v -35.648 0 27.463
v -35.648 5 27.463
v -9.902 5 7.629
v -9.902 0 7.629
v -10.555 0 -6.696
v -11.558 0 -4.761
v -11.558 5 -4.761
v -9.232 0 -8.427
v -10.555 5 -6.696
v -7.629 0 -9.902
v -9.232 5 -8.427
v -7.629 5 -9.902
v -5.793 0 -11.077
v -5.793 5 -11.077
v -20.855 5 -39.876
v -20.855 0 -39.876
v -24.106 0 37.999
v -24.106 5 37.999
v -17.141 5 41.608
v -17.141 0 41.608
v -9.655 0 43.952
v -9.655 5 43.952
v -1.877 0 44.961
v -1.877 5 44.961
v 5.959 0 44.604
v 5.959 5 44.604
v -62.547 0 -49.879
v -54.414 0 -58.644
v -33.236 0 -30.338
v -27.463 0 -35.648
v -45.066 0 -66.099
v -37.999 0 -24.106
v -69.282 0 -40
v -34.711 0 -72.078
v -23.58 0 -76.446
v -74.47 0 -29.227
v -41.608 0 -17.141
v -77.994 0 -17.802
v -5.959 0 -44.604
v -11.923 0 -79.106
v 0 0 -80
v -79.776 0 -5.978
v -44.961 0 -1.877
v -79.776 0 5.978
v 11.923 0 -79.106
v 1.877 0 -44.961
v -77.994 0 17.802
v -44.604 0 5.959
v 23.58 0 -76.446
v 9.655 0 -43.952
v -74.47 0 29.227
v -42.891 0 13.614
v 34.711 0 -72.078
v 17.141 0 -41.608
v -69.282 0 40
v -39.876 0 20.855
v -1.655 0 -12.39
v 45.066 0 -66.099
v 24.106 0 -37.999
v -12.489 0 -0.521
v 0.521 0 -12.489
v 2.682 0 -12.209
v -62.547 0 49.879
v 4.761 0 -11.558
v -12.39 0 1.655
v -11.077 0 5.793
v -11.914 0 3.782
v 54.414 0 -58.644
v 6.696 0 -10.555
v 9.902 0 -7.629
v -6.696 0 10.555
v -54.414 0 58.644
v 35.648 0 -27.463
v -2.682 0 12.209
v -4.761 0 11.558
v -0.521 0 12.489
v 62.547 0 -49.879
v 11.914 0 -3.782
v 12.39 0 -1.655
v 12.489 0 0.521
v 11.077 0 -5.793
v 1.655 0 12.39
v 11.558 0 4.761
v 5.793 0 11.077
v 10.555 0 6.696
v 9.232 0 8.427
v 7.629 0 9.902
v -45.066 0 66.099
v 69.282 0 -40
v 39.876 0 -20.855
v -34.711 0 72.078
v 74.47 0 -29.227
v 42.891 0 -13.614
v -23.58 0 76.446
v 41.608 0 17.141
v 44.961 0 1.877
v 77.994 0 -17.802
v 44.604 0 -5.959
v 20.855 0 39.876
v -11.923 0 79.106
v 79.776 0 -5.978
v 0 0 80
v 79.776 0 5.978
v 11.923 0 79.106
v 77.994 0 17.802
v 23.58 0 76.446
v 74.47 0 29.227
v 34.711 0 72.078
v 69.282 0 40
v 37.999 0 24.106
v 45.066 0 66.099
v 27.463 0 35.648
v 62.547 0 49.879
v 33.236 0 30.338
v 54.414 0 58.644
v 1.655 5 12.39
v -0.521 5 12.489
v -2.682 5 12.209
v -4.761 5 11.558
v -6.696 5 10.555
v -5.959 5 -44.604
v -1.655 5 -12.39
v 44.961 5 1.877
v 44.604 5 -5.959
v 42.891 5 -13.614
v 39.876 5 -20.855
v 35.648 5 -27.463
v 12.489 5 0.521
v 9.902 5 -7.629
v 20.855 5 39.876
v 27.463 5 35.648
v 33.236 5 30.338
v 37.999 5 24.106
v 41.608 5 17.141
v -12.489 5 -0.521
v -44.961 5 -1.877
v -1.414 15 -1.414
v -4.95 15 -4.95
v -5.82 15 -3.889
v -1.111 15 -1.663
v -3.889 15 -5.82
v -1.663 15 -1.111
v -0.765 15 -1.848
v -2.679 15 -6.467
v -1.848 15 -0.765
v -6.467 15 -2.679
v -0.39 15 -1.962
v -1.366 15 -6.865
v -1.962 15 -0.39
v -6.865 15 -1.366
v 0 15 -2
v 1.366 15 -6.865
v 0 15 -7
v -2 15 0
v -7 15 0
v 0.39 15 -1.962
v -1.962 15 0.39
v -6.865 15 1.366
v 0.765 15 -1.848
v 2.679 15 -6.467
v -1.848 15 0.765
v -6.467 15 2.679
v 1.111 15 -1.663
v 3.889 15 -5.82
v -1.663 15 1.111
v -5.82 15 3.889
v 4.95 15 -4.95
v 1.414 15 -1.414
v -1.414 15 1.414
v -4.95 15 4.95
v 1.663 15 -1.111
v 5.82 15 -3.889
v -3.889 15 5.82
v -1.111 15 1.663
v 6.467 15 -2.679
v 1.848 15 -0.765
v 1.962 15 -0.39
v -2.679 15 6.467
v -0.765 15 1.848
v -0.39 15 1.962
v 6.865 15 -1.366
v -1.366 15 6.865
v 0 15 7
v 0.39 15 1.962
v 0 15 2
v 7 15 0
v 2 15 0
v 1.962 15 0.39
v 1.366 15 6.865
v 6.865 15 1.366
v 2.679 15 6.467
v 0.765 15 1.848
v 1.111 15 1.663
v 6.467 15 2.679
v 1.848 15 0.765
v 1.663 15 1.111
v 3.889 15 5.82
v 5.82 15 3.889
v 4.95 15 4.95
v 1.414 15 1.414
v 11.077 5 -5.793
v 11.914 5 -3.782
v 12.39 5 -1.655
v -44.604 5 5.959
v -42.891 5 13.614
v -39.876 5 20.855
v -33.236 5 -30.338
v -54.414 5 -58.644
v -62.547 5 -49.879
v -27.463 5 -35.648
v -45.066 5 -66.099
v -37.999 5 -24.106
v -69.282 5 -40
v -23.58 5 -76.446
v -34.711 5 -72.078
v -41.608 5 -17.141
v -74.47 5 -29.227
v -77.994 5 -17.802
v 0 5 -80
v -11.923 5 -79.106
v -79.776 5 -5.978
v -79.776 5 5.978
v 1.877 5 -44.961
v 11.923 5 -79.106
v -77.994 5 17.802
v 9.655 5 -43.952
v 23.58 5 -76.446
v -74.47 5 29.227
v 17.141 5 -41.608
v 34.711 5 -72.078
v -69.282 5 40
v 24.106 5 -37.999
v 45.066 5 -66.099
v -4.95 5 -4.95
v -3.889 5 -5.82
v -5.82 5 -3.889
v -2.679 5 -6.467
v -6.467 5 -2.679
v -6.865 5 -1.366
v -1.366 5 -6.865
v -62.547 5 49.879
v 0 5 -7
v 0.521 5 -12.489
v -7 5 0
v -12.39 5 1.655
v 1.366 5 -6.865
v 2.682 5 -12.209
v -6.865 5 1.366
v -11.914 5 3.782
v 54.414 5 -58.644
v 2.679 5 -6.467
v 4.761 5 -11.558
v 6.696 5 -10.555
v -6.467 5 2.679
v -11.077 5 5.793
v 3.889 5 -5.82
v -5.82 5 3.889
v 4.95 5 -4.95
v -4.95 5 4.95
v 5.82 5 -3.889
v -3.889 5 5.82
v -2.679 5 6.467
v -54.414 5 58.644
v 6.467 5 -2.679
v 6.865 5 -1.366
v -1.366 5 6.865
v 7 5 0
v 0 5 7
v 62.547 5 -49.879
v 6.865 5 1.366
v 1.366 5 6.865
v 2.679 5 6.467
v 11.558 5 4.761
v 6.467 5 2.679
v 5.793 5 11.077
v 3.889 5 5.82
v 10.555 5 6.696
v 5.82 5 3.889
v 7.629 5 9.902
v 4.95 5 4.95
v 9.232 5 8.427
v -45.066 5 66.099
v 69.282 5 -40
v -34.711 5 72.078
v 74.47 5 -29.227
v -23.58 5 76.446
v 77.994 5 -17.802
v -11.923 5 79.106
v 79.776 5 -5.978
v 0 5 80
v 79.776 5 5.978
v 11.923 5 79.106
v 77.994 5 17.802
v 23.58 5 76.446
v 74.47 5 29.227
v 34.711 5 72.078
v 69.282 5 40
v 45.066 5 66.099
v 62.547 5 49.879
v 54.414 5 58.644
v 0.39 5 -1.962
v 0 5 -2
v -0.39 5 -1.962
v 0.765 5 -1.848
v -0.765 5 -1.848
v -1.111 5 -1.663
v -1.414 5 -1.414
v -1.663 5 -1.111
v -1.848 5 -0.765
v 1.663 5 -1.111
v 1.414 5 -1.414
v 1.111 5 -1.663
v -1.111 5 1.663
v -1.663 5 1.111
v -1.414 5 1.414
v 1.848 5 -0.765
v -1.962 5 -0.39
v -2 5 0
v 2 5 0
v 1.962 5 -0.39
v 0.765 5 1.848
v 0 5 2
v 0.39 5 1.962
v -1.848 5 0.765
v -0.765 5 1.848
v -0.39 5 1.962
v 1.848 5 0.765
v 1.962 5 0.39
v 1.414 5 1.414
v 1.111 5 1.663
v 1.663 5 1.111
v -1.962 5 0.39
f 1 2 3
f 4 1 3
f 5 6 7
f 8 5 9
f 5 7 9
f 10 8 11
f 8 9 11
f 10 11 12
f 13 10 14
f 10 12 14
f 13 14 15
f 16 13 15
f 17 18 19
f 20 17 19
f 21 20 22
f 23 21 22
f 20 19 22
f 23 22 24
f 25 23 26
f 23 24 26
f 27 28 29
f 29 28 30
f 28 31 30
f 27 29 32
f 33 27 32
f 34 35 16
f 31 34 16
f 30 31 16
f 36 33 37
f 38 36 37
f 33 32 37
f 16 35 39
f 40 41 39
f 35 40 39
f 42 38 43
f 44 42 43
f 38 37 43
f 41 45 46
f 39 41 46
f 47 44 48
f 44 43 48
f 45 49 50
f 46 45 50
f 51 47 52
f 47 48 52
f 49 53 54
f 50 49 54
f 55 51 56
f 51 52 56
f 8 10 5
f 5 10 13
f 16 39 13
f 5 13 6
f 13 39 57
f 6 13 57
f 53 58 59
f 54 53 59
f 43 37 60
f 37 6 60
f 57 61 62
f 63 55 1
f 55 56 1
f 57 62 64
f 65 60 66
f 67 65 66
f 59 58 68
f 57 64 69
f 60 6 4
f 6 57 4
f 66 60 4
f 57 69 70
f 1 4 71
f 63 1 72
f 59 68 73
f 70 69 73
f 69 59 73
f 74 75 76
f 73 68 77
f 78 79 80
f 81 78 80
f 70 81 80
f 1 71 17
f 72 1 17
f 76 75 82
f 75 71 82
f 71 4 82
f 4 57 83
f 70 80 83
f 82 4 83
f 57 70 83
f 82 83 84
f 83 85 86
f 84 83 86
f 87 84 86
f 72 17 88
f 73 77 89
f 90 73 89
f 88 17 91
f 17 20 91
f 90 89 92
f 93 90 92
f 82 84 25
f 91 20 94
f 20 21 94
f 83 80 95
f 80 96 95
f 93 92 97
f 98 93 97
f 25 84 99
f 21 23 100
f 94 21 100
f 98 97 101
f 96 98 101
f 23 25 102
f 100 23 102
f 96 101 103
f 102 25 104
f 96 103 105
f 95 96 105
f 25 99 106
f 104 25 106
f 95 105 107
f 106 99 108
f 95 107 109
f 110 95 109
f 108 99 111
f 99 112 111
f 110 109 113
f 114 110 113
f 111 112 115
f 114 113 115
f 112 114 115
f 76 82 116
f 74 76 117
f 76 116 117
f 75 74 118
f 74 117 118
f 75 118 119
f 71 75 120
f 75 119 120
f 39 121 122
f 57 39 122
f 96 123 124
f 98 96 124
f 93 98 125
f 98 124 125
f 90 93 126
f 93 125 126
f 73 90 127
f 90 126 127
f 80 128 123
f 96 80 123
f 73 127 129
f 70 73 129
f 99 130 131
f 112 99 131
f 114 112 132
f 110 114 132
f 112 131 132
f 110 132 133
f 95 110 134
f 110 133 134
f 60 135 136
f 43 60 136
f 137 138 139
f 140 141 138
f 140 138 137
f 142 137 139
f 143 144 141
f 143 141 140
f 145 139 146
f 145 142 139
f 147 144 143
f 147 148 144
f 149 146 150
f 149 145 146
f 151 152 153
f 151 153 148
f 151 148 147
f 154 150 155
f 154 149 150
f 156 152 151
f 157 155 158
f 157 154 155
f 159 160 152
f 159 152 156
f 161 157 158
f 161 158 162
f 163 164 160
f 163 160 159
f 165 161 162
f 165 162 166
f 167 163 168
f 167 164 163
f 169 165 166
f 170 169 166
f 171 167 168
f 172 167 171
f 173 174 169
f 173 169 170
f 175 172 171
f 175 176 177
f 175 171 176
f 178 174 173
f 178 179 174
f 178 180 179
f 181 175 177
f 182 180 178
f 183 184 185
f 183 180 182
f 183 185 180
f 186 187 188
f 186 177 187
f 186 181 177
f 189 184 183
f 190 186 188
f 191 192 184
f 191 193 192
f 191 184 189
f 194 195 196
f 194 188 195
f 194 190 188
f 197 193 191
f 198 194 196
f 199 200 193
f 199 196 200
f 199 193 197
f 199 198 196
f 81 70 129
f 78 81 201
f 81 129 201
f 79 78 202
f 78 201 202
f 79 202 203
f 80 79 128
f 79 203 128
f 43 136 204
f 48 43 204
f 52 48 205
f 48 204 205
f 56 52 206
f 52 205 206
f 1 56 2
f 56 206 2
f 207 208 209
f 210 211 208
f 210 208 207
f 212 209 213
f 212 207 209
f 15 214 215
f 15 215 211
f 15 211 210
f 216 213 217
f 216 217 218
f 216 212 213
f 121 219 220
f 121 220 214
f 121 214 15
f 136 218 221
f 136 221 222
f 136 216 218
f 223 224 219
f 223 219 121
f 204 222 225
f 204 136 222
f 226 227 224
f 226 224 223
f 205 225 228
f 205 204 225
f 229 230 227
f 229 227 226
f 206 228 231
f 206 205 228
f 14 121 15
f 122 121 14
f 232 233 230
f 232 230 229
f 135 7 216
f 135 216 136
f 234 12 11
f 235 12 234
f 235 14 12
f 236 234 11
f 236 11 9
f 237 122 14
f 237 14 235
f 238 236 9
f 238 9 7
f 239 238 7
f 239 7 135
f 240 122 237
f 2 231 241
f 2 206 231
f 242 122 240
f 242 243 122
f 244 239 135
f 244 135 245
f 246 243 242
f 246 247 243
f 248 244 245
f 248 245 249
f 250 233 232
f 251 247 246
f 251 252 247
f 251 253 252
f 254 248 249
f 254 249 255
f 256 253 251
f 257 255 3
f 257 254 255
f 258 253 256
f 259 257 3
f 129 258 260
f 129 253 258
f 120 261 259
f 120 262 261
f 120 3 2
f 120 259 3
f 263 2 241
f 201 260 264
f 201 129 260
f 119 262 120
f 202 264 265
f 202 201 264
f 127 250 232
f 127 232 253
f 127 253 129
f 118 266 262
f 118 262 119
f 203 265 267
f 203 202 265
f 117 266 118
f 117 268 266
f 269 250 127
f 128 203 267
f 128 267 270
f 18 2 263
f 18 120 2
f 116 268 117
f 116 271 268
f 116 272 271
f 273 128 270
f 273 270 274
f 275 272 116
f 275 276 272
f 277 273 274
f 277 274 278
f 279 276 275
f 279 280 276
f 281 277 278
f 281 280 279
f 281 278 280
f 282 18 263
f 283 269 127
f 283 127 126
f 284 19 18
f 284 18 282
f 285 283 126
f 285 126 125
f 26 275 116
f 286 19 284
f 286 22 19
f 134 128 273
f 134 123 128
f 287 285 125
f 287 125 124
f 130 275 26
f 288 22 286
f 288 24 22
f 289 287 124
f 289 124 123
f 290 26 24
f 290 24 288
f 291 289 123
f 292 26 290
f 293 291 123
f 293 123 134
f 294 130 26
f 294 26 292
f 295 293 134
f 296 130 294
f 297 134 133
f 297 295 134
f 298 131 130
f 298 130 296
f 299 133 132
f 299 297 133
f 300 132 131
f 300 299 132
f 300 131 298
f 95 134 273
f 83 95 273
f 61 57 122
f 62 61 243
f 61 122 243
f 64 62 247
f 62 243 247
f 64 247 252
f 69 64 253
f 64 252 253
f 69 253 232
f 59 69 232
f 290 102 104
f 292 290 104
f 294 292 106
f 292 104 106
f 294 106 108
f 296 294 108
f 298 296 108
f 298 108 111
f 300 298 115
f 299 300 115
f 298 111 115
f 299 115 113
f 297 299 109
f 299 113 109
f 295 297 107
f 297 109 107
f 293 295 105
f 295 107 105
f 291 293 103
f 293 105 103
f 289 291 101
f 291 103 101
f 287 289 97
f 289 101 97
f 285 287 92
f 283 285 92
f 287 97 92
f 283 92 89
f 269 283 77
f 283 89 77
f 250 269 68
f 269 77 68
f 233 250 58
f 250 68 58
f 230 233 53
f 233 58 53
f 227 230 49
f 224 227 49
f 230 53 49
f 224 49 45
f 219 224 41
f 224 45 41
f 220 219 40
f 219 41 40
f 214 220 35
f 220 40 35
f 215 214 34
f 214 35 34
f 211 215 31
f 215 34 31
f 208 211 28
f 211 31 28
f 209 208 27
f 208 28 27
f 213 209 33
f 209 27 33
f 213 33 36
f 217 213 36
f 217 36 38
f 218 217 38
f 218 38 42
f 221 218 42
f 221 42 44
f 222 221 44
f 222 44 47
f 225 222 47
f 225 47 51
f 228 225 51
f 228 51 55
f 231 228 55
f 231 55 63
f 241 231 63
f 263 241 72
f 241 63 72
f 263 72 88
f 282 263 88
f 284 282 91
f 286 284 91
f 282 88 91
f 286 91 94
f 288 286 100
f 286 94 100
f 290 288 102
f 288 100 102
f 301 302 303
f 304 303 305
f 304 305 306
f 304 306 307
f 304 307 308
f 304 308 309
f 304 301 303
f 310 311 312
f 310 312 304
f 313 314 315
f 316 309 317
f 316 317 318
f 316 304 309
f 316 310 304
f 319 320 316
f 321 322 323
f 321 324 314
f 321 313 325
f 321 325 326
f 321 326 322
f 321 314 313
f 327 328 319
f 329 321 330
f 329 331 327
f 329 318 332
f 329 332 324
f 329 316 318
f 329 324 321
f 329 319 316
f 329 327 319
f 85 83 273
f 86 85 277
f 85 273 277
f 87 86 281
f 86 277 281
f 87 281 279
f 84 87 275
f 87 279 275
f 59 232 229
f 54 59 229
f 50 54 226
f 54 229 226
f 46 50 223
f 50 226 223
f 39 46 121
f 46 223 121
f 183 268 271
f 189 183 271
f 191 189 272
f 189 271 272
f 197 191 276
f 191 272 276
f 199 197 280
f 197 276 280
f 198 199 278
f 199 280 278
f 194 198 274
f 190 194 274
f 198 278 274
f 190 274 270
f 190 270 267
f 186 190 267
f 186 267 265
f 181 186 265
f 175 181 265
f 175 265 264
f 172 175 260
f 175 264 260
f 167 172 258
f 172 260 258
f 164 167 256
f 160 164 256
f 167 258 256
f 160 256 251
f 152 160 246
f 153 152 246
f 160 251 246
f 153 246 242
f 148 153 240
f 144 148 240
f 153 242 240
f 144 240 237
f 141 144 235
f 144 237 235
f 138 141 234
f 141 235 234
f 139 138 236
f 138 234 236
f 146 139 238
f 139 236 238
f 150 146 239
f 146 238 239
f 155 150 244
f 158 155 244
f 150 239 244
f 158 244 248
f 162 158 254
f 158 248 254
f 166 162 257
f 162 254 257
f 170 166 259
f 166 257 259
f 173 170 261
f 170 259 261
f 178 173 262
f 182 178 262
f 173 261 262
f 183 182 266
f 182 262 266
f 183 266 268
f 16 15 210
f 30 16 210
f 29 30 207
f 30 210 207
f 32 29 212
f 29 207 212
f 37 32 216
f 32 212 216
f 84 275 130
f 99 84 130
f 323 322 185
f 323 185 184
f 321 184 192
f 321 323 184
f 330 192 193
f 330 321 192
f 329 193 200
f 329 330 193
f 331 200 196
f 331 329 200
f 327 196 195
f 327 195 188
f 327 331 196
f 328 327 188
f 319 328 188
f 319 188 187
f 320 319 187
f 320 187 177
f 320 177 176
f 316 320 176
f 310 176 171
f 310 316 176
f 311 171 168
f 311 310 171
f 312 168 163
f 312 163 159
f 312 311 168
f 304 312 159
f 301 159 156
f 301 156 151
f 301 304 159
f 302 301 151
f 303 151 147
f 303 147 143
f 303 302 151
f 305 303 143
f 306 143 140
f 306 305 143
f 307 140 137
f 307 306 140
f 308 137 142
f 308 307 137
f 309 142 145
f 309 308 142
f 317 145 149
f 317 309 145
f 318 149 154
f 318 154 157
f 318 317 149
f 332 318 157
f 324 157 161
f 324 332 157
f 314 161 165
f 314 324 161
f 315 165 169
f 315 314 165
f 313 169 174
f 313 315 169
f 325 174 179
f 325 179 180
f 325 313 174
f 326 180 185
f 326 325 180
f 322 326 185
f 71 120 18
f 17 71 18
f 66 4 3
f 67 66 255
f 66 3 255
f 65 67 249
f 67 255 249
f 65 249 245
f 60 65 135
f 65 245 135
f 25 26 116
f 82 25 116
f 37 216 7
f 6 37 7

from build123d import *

# Parameters (mm, degrees)
SKETCH_1_R               = 80
EXTRUDE_1_DEPTH          = 5
CUT_EXTRUDE_3_DEPTH      = 114.247516529
PATTERN_CIRCULAR_2_COUNT = 6
SKETCH_2_R               = 7
SKETCH_2_R_2             = 2
EXTRUDE_2_DEPTH          = 10


with BuildPart() as part:
    # 草图1 → 凸台-拉伸1 (new body)
    with BuildSketch(Plane(origin=(0, 0, 0), x_dir=(1, 0, 0), z_dir=(0, 1, 0))):
        Circle(SKETCH_1_R)
    extrude(amount=EXTRUDE_1_DEPTH)

    # 草图5 → 切除-拉伸3 (cut, through all)
    with BuildSketch(Plane(origin=(0, 5, 0), x_dir=(1, 0, 0), z_dir=(0, 1, 0))):
        with BuildLine():
            Line((-41.607553791, 17.140929599), (-11.557653831, 4.761369333))
            ThreePointArc((-11.557653831, 4.761369333), (-9.232157797, 8.427174047), (-5.79312728, 11.076537199))
            Line((-5.79312728, 11.076537199), (-20.855258209, 39.875533916))
            ThreePointArc((-20.855258209, 39.875533916), (-33.235768068, 30.337826569), (-41.607553791, 17.140929599))
        make_face()
    cut_extrude_3 = extrude(amount=-CUT_EXTRUDE_3_DEPTH, mode=Mode.SUBTRACT)

    # 阵列(圆周)2: 切除-拉伸3 ×6 about axis
    pattern_circular_2_axis = Axis((0, 5, 0), (0, 1, 0))
    for i in range(1, PATTERN_CIRCULAR_2_COUNT):
        add(cut_extrude_3.rotate(pattern_circular_2_axis, i * 360 / PATTERN_CIRCULAR_2_COUNT), mode=Mode.SUBTRACT)

    # 草图2 → 凸台-拉伸2 (add)
    with BuildSketch(Plane(origin=(0, 5, 0), x_dir=(1, 0, 0), z_dir=(0, 1, 0))):
        Circle(SKETCH_2_R)
        Circle(SKETCH_2_R_2, mode=Mode.SUBTRACT)
    extrude(amount=EXTRUDE_2_DEPTH)


solid = part.part
